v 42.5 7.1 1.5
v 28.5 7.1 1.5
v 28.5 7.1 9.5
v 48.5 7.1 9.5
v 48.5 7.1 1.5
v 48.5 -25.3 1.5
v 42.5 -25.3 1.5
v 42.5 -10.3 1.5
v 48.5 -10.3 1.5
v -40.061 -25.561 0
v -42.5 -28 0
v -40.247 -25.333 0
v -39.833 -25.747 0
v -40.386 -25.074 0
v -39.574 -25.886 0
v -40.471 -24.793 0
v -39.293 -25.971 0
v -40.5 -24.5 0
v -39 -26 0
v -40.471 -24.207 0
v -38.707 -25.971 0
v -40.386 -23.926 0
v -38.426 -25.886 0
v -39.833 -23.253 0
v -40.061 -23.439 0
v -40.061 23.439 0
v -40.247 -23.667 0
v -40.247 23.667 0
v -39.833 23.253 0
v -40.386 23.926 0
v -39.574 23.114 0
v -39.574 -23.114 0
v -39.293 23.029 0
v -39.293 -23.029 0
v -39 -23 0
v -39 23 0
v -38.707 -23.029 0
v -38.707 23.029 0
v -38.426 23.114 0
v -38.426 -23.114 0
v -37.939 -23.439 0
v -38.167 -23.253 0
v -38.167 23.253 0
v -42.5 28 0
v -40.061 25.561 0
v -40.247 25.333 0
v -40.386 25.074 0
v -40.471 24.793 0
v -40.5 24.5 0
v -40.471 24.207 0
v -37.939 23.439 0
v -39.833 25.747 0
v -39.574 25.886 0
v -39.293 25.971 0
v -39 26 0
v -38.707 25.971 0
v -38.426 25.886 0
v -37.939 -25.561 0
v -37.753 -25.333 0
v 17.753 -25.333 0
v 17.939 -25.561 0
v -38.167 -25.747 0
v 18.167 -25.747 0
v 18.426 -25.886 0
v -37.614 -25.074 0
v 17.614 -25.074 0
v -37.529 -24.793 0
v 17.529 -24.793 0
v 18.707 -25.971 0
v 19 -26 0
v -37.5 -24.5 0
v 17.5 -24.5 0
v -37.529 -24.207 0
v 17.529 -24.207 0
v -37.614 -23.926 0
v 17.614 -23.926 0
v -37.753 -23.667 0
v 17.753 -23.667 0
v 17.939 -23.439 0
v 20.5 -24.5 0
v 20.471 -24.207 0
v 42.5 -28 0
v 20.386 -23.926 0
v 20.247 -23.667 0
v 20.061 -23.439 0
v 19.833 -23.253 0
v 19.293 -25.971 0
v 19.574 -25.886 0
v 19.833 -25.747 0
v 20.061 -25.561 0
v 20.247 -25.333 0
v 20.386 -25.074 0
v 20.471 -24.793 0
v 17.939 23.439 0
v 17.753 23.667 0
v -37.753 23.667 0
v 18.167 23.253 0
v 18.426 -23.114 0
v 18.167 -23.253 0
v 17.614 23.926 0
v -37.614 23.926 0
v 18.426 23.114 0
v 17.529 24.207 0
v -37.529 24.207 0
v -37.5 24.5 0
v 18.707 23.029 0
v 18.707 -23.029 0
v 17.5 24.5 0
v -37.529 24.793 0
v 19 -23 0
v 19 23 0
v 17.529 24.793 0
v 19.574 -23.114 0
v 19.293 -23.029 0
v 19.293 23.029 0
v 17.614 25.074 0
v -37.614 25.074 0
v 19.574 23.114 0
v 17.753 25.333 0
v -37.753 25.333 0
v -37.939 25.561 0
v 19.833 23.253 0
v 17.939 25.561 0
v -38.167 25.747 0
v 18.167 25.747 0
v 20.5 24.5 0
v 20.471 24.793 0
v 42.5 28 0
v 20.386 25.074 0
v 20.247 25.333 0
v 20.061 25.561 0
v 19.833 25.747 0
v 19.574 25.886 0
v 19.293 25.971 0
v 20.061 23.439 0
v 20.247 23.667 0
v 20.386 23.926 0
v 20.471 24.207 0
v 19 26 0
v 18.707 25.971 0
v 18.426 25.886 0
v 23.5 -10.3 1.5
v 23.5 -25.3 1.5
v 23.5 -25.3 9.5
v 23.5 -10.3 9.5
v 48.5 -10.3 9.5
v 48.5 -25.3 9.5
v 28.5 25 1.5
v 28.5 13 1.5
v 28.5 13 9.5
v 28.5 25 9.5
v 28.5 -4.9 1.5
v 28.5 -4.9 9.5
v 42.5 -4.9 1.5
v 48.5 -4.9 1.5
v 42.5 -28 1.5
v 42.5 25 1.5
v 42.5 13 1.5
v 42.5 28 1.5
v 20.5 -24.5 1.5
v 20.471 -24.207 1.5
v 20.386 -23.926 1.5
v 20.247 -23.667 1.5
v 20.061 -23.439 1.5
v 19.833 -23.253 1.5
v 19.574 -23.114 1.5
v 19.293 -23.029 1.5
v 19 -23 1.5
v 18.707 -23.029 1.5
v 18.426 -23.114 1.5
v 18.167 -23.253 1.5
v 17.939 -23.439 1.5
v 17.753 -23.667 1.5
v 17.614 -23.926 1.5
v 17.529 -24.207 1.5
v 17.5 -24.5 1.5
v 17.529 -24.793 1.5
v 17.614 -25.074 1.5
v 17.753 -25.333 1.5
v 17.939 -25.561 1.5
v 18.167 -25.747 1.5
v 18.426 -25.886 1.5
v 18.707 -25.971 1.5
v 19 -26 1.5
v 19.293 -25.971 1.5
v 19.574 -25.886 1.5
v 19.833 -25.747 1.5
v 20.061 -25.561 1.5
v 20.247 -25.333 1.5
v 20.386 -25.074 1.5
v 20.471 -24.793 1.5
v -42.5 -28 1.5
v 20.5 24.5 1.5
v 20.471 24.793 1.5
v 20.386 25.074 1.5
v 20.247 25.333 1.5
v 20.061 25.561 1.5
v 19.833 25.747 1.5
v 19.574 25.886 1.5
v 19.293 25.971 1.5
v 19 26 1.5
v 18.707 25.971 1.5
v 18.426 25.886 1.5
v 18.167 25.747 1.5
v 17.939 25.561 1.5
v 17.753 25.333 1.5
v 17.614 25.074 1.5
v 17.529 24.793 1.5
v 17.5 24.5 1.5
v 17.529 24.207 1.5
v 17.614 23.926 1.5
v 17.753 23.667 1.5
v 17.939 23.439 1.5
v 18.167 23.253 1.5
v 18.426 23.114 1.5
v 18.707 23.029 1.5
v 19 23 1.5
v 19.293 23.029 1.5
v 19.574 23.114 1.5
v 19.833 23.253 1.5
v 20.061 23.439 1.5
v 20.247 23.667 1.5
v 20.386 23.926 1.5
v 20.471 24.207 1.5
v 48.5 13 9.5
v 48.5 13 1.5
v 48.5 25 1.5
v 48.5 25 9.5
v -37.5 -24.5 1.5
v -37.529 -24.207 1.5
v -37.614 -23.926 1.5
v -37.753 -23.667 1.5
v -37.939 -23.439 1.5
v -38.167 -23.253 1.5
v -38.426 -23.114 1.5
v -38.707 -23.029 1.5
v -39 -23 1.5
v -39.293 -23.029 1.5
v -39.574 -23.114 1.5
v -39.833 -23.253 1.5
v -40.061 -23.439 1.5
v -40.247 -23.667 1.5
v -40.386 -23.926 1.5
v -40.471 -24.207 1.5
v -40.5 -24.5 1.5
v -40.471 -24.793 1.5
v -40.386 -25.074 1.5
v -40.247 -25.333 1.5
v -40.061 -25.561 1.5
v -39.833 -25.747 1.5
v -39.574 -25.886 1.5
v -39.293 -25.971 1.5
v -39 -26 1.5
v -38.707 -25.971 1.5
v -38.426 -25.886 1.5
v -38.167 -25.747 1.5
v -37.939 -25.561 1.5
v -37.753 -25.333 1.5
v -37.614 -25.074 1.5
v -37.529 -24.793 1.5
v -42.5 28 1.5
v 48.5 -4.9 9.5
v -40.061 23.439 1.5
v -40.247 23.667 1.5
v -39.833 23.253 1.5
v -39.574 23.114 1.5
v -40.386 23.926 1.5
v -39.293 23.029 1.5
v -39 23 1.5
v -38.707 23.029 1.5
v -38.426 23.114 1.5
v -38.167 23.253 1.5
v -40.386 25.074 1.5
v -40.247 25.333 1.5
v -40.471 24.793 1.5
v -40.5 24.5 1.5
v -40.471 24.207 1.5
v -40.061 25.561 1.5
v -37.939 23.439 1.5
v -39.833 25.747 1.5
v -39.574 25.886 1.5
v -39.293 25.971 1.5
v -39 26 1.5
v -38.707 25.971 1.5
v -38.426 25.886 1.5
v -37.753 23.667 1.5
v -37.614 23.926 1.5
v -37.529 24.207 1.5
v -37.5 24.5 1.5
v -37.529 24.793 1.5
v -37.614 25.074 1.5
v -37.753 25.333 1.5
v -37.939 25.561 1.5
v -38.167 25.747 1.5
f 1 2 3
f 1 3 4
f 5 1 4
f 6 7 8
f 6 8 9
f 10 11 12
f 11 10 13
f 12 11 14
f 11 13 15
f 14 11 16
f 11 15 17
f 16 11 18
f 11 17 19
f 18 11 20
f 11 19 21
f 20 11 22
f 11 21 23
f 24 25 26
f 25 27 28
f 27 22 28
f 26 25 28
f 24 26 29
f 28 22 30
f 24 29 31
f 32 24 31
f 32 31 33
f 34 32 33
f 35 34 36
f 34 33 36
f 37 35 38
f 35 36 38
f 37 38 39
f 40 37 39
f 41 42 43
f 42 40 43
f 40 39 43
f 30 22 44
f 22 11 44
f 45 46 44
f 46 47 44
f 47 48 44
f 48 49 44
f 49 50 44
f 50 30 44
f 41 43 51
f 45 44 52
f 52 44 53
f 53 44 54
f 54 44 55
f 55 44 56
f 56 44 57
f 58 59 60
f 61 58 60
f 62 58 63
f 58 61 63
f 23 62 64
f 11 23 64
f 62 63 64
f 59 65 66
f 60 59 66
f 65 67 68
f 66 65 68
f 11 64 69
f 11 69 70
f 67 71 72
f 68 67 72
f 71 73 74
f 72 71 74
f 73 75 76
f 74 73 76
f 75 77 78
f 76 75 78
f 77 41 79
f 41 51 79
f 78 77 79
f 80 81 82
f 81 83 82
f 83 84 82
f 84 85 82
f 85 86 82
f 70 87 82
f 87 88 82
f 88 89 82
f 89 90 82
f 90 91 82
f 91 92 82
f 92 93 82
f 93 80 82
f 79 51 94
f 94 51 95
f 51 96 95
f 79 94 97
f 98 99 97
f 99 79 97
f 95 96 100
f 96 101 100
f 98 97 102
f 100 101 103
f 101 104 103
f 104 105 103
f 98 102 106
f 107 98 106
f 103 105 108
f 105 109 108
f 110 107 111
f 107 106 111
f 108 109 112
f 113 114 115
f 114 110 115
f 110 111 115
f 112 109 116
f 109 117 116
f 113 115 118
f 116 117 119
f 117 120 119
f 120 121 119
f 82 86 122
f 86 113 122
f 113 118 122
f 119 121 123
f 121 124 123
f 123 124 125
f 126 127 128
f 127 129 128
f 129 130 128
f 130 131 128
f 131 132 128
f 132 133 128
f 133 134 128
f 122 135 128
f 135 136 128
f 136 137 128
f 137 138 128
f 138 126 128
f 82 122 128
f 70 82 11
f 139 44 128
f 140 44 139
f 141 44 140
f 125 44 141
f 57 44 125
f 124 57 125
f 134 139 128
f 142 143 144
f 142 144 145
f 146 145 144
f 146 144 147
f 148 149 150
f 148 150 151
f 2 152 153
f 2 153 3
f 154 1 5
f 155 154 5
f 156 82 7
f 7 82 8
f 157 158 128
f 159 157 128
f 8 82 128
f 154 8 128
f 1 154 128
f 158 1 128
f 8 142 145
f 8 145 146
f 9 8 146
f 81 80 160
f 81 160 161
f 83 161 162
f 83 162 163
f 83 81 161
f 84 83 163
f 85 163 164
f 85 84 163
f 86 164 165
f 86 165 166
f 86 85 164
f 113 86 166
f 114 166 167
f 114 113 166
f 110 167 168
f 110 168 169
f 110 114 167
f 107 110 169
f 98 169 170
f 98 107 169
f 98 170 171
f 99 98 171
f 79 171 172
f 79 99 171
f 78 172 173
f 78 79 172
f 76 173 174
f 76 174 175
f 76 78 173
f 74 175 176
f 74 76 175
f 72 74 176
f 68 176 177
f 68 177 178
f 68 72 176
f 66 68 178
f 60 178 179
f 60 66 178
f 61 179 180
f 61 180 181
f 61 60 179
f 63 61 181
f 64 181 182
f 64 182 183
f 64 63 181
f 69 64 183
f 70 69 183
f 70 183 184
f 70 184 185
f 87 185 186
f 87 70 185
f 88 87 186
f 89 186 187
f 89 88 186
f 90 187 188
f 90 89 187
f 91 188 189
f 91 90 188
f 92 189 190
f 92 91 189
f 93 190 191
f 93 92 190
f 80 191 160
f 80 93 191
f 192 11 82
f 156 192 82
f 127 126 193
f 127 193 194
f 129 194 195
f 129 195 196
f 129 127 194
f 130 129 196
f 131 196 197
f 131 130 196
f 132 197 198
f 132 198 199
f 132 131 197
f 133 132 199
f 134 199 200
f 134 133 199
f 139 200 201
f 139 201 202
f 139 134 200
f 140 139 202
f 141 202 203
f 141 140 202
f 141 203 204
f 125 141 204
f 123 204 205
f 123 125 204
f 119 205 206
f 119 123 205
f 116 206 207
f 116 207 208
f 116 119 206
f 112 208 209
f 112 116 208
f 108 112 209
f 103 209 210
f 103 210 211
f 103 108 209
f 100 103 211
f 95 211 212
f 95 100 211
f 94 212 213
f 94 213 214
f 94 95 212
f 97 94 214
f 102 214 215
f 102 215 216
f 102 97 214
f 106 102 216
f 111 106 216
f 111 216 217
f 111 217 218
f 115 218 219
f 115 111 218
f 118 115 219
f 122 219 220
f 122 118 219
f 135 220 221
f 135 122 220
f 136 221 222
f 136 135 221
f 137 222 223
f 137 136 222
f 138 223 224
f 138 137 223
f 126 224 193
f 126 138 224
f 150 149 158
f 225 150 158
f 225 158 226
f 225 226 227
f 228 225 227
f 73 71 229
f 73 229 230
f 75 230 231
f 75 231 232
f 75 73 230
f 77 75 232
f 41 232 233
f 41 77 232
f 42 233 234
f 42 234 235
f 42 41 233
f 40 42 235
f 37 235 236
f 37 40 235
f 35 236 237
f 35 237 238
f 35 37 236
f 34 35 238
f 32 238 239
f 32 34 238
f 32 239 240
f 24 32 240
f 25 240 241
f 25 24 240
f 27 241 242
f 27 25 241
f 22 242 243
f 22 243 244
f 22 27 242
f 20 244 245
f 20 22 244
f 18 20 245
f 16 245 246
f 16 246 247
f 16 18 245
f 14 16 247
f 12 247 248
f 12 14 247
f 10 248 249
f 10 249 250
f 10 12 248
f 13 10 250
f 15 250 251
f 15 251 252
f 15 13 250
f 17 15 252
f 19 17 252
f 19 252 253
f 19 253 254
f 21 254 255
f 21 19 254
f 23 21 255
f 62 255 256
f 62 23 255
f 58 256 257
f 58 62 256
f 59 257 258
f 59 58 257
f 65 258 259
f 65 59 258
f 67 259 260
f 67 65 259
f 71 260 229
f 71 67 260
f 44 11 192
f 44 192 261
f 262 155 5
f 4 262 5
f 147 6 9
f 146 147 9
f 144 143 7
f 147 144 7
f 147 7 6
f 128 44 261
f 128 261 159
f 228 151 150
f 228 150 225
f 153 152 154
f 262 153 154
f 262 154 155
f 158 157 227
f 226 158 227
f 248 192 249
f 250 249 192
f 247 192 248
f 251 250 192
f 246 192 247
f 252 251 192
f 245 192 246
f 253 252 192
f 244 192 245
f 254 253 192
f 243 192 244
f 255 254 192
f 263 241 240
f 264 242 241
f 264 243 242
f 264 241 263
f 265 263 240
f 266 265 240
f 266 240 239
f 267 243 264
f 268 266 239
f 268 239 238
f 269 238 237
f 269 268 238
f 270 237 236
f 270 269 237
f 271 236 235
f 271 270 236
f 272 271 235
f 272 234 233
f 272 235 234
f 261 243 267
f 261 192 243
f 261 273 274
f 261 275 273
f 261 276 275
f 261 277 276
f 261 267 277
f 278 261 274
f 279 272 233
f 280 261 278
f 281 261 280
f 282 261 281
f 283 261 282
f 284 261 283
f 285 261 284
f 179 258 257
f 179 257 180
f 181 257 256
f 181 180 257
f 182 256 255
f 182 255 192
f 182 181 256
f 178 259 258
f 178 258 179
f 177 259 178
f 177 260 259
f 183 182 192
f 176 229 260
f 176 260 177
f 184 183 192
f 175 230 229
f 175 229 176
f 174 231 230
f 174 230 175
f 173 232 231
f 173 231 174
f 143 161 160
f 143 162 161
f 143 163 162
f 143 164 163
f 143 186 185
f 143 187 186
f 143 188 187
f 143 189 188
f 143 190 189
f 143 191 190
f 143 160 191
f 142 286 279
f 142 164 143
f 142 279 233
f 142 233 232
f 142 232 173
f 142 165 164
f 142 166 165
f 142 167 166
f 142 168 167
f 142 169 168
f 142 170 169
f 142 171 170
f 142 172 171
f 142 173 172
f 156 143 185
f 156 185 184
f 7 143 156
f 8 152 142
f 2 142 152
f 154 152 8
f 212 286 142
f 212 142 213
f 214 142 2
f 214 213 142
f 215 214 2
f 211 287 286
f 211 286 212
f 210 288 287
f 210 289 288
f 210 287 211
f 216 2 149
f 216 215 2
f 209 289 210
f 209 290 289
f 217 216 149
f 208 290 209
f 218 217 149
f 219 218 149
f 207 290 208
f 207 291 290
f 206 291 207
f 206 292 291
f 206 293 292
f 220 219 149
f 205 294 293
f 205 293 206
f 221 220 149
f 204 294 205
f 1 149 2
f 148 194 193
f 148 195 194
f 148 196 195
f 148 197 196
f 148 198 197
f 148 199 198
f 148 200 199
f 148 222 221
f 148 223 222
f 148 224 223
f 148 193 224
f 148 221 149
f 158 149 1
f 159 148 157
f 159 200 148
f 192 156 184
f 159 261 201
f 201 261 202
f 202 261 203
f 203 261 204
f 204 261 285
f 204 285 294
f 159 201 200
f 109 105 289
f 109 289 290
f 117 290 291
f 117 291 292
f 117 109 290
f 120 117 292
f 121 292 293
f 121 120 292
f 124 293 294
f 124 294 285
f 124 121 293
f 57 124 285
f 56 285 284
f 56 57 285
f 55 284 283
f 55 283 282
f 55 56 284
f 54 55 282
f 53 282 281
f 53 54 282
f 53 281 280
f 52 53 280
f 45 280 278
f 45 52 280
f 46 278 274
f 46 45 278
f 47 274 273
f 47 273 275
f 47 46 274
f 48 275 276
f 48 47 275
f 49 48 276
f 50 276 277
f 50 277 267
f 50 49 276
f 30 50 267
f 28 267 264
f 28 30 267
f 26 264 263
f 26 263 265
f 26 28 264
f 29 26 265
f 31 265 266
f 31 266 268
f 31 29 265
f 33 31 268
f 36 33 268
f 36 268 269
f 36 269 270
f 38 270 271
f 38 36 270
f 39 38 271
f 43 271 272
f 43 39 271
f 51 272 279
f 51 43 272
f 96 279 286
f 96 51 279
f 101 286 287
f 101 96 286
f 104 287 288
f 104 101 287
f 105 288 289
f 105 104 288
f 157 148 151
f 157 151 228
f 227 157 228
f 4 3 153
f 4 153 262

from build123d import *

# Parameters (mm, degrees)
SKETCH1_W           = 85
SKETCH1_H           = 56
SKETCH1_R           = 1.5
BOSS_EXTRUDE1_DEPTH = 1.5
SKETCH2_W           = 25
SKETCH2_H           = 15
SKETCH2_W_2         = 20
SKETCH2_H_2         = 12
BOSS_EXTRUDE2_DEPTH = 8


with BuildPart() as part:
    # Sketch1 → Boss-Extrude1 (new body)
    with BuildSketch(Plane.XY):
        Rectangle(SKETCH1_W, SKETCH1_H)
        with Locations((-39, 24.5)):
            Circle(SKETCH1_R, mode=Mode.SUBTRACT)
        with Locations((19, 24.5)):
            Circle(SKETCH1_R, mode=Mode.SUBTRACT)
        with Locations((19, -24.5)):
            Circle(SKETCH1_R, mode=Mode.SUBTRACT)
        with Locations((-39, -24.5)):
            Circle(SKETCH1_R, mode=Mode.SUBTRACT)
    extrude(amount=BOSS_EXTRUDE1_DEPTH)

    # Sketch2 → Boss-Extrude2 (add)
    with BuildSketch(Plane.XY.offset(1.5)):
        with Locations((36, -17.8)):
            Rectangle(SKETCH2_W, SKETCH2_H)
        with Locations((38.5, 1.1)):
            Rectangle(SKETCH2_W_2, SKETCH2_H_2)
        with Locations((38.5, 19)):
            Rectangle(SKETCH2_W_2, SKETCH2_H_2)
    extrude(amount=BOSS_EXTRUDE2_DEPTH)


solid = part.part
